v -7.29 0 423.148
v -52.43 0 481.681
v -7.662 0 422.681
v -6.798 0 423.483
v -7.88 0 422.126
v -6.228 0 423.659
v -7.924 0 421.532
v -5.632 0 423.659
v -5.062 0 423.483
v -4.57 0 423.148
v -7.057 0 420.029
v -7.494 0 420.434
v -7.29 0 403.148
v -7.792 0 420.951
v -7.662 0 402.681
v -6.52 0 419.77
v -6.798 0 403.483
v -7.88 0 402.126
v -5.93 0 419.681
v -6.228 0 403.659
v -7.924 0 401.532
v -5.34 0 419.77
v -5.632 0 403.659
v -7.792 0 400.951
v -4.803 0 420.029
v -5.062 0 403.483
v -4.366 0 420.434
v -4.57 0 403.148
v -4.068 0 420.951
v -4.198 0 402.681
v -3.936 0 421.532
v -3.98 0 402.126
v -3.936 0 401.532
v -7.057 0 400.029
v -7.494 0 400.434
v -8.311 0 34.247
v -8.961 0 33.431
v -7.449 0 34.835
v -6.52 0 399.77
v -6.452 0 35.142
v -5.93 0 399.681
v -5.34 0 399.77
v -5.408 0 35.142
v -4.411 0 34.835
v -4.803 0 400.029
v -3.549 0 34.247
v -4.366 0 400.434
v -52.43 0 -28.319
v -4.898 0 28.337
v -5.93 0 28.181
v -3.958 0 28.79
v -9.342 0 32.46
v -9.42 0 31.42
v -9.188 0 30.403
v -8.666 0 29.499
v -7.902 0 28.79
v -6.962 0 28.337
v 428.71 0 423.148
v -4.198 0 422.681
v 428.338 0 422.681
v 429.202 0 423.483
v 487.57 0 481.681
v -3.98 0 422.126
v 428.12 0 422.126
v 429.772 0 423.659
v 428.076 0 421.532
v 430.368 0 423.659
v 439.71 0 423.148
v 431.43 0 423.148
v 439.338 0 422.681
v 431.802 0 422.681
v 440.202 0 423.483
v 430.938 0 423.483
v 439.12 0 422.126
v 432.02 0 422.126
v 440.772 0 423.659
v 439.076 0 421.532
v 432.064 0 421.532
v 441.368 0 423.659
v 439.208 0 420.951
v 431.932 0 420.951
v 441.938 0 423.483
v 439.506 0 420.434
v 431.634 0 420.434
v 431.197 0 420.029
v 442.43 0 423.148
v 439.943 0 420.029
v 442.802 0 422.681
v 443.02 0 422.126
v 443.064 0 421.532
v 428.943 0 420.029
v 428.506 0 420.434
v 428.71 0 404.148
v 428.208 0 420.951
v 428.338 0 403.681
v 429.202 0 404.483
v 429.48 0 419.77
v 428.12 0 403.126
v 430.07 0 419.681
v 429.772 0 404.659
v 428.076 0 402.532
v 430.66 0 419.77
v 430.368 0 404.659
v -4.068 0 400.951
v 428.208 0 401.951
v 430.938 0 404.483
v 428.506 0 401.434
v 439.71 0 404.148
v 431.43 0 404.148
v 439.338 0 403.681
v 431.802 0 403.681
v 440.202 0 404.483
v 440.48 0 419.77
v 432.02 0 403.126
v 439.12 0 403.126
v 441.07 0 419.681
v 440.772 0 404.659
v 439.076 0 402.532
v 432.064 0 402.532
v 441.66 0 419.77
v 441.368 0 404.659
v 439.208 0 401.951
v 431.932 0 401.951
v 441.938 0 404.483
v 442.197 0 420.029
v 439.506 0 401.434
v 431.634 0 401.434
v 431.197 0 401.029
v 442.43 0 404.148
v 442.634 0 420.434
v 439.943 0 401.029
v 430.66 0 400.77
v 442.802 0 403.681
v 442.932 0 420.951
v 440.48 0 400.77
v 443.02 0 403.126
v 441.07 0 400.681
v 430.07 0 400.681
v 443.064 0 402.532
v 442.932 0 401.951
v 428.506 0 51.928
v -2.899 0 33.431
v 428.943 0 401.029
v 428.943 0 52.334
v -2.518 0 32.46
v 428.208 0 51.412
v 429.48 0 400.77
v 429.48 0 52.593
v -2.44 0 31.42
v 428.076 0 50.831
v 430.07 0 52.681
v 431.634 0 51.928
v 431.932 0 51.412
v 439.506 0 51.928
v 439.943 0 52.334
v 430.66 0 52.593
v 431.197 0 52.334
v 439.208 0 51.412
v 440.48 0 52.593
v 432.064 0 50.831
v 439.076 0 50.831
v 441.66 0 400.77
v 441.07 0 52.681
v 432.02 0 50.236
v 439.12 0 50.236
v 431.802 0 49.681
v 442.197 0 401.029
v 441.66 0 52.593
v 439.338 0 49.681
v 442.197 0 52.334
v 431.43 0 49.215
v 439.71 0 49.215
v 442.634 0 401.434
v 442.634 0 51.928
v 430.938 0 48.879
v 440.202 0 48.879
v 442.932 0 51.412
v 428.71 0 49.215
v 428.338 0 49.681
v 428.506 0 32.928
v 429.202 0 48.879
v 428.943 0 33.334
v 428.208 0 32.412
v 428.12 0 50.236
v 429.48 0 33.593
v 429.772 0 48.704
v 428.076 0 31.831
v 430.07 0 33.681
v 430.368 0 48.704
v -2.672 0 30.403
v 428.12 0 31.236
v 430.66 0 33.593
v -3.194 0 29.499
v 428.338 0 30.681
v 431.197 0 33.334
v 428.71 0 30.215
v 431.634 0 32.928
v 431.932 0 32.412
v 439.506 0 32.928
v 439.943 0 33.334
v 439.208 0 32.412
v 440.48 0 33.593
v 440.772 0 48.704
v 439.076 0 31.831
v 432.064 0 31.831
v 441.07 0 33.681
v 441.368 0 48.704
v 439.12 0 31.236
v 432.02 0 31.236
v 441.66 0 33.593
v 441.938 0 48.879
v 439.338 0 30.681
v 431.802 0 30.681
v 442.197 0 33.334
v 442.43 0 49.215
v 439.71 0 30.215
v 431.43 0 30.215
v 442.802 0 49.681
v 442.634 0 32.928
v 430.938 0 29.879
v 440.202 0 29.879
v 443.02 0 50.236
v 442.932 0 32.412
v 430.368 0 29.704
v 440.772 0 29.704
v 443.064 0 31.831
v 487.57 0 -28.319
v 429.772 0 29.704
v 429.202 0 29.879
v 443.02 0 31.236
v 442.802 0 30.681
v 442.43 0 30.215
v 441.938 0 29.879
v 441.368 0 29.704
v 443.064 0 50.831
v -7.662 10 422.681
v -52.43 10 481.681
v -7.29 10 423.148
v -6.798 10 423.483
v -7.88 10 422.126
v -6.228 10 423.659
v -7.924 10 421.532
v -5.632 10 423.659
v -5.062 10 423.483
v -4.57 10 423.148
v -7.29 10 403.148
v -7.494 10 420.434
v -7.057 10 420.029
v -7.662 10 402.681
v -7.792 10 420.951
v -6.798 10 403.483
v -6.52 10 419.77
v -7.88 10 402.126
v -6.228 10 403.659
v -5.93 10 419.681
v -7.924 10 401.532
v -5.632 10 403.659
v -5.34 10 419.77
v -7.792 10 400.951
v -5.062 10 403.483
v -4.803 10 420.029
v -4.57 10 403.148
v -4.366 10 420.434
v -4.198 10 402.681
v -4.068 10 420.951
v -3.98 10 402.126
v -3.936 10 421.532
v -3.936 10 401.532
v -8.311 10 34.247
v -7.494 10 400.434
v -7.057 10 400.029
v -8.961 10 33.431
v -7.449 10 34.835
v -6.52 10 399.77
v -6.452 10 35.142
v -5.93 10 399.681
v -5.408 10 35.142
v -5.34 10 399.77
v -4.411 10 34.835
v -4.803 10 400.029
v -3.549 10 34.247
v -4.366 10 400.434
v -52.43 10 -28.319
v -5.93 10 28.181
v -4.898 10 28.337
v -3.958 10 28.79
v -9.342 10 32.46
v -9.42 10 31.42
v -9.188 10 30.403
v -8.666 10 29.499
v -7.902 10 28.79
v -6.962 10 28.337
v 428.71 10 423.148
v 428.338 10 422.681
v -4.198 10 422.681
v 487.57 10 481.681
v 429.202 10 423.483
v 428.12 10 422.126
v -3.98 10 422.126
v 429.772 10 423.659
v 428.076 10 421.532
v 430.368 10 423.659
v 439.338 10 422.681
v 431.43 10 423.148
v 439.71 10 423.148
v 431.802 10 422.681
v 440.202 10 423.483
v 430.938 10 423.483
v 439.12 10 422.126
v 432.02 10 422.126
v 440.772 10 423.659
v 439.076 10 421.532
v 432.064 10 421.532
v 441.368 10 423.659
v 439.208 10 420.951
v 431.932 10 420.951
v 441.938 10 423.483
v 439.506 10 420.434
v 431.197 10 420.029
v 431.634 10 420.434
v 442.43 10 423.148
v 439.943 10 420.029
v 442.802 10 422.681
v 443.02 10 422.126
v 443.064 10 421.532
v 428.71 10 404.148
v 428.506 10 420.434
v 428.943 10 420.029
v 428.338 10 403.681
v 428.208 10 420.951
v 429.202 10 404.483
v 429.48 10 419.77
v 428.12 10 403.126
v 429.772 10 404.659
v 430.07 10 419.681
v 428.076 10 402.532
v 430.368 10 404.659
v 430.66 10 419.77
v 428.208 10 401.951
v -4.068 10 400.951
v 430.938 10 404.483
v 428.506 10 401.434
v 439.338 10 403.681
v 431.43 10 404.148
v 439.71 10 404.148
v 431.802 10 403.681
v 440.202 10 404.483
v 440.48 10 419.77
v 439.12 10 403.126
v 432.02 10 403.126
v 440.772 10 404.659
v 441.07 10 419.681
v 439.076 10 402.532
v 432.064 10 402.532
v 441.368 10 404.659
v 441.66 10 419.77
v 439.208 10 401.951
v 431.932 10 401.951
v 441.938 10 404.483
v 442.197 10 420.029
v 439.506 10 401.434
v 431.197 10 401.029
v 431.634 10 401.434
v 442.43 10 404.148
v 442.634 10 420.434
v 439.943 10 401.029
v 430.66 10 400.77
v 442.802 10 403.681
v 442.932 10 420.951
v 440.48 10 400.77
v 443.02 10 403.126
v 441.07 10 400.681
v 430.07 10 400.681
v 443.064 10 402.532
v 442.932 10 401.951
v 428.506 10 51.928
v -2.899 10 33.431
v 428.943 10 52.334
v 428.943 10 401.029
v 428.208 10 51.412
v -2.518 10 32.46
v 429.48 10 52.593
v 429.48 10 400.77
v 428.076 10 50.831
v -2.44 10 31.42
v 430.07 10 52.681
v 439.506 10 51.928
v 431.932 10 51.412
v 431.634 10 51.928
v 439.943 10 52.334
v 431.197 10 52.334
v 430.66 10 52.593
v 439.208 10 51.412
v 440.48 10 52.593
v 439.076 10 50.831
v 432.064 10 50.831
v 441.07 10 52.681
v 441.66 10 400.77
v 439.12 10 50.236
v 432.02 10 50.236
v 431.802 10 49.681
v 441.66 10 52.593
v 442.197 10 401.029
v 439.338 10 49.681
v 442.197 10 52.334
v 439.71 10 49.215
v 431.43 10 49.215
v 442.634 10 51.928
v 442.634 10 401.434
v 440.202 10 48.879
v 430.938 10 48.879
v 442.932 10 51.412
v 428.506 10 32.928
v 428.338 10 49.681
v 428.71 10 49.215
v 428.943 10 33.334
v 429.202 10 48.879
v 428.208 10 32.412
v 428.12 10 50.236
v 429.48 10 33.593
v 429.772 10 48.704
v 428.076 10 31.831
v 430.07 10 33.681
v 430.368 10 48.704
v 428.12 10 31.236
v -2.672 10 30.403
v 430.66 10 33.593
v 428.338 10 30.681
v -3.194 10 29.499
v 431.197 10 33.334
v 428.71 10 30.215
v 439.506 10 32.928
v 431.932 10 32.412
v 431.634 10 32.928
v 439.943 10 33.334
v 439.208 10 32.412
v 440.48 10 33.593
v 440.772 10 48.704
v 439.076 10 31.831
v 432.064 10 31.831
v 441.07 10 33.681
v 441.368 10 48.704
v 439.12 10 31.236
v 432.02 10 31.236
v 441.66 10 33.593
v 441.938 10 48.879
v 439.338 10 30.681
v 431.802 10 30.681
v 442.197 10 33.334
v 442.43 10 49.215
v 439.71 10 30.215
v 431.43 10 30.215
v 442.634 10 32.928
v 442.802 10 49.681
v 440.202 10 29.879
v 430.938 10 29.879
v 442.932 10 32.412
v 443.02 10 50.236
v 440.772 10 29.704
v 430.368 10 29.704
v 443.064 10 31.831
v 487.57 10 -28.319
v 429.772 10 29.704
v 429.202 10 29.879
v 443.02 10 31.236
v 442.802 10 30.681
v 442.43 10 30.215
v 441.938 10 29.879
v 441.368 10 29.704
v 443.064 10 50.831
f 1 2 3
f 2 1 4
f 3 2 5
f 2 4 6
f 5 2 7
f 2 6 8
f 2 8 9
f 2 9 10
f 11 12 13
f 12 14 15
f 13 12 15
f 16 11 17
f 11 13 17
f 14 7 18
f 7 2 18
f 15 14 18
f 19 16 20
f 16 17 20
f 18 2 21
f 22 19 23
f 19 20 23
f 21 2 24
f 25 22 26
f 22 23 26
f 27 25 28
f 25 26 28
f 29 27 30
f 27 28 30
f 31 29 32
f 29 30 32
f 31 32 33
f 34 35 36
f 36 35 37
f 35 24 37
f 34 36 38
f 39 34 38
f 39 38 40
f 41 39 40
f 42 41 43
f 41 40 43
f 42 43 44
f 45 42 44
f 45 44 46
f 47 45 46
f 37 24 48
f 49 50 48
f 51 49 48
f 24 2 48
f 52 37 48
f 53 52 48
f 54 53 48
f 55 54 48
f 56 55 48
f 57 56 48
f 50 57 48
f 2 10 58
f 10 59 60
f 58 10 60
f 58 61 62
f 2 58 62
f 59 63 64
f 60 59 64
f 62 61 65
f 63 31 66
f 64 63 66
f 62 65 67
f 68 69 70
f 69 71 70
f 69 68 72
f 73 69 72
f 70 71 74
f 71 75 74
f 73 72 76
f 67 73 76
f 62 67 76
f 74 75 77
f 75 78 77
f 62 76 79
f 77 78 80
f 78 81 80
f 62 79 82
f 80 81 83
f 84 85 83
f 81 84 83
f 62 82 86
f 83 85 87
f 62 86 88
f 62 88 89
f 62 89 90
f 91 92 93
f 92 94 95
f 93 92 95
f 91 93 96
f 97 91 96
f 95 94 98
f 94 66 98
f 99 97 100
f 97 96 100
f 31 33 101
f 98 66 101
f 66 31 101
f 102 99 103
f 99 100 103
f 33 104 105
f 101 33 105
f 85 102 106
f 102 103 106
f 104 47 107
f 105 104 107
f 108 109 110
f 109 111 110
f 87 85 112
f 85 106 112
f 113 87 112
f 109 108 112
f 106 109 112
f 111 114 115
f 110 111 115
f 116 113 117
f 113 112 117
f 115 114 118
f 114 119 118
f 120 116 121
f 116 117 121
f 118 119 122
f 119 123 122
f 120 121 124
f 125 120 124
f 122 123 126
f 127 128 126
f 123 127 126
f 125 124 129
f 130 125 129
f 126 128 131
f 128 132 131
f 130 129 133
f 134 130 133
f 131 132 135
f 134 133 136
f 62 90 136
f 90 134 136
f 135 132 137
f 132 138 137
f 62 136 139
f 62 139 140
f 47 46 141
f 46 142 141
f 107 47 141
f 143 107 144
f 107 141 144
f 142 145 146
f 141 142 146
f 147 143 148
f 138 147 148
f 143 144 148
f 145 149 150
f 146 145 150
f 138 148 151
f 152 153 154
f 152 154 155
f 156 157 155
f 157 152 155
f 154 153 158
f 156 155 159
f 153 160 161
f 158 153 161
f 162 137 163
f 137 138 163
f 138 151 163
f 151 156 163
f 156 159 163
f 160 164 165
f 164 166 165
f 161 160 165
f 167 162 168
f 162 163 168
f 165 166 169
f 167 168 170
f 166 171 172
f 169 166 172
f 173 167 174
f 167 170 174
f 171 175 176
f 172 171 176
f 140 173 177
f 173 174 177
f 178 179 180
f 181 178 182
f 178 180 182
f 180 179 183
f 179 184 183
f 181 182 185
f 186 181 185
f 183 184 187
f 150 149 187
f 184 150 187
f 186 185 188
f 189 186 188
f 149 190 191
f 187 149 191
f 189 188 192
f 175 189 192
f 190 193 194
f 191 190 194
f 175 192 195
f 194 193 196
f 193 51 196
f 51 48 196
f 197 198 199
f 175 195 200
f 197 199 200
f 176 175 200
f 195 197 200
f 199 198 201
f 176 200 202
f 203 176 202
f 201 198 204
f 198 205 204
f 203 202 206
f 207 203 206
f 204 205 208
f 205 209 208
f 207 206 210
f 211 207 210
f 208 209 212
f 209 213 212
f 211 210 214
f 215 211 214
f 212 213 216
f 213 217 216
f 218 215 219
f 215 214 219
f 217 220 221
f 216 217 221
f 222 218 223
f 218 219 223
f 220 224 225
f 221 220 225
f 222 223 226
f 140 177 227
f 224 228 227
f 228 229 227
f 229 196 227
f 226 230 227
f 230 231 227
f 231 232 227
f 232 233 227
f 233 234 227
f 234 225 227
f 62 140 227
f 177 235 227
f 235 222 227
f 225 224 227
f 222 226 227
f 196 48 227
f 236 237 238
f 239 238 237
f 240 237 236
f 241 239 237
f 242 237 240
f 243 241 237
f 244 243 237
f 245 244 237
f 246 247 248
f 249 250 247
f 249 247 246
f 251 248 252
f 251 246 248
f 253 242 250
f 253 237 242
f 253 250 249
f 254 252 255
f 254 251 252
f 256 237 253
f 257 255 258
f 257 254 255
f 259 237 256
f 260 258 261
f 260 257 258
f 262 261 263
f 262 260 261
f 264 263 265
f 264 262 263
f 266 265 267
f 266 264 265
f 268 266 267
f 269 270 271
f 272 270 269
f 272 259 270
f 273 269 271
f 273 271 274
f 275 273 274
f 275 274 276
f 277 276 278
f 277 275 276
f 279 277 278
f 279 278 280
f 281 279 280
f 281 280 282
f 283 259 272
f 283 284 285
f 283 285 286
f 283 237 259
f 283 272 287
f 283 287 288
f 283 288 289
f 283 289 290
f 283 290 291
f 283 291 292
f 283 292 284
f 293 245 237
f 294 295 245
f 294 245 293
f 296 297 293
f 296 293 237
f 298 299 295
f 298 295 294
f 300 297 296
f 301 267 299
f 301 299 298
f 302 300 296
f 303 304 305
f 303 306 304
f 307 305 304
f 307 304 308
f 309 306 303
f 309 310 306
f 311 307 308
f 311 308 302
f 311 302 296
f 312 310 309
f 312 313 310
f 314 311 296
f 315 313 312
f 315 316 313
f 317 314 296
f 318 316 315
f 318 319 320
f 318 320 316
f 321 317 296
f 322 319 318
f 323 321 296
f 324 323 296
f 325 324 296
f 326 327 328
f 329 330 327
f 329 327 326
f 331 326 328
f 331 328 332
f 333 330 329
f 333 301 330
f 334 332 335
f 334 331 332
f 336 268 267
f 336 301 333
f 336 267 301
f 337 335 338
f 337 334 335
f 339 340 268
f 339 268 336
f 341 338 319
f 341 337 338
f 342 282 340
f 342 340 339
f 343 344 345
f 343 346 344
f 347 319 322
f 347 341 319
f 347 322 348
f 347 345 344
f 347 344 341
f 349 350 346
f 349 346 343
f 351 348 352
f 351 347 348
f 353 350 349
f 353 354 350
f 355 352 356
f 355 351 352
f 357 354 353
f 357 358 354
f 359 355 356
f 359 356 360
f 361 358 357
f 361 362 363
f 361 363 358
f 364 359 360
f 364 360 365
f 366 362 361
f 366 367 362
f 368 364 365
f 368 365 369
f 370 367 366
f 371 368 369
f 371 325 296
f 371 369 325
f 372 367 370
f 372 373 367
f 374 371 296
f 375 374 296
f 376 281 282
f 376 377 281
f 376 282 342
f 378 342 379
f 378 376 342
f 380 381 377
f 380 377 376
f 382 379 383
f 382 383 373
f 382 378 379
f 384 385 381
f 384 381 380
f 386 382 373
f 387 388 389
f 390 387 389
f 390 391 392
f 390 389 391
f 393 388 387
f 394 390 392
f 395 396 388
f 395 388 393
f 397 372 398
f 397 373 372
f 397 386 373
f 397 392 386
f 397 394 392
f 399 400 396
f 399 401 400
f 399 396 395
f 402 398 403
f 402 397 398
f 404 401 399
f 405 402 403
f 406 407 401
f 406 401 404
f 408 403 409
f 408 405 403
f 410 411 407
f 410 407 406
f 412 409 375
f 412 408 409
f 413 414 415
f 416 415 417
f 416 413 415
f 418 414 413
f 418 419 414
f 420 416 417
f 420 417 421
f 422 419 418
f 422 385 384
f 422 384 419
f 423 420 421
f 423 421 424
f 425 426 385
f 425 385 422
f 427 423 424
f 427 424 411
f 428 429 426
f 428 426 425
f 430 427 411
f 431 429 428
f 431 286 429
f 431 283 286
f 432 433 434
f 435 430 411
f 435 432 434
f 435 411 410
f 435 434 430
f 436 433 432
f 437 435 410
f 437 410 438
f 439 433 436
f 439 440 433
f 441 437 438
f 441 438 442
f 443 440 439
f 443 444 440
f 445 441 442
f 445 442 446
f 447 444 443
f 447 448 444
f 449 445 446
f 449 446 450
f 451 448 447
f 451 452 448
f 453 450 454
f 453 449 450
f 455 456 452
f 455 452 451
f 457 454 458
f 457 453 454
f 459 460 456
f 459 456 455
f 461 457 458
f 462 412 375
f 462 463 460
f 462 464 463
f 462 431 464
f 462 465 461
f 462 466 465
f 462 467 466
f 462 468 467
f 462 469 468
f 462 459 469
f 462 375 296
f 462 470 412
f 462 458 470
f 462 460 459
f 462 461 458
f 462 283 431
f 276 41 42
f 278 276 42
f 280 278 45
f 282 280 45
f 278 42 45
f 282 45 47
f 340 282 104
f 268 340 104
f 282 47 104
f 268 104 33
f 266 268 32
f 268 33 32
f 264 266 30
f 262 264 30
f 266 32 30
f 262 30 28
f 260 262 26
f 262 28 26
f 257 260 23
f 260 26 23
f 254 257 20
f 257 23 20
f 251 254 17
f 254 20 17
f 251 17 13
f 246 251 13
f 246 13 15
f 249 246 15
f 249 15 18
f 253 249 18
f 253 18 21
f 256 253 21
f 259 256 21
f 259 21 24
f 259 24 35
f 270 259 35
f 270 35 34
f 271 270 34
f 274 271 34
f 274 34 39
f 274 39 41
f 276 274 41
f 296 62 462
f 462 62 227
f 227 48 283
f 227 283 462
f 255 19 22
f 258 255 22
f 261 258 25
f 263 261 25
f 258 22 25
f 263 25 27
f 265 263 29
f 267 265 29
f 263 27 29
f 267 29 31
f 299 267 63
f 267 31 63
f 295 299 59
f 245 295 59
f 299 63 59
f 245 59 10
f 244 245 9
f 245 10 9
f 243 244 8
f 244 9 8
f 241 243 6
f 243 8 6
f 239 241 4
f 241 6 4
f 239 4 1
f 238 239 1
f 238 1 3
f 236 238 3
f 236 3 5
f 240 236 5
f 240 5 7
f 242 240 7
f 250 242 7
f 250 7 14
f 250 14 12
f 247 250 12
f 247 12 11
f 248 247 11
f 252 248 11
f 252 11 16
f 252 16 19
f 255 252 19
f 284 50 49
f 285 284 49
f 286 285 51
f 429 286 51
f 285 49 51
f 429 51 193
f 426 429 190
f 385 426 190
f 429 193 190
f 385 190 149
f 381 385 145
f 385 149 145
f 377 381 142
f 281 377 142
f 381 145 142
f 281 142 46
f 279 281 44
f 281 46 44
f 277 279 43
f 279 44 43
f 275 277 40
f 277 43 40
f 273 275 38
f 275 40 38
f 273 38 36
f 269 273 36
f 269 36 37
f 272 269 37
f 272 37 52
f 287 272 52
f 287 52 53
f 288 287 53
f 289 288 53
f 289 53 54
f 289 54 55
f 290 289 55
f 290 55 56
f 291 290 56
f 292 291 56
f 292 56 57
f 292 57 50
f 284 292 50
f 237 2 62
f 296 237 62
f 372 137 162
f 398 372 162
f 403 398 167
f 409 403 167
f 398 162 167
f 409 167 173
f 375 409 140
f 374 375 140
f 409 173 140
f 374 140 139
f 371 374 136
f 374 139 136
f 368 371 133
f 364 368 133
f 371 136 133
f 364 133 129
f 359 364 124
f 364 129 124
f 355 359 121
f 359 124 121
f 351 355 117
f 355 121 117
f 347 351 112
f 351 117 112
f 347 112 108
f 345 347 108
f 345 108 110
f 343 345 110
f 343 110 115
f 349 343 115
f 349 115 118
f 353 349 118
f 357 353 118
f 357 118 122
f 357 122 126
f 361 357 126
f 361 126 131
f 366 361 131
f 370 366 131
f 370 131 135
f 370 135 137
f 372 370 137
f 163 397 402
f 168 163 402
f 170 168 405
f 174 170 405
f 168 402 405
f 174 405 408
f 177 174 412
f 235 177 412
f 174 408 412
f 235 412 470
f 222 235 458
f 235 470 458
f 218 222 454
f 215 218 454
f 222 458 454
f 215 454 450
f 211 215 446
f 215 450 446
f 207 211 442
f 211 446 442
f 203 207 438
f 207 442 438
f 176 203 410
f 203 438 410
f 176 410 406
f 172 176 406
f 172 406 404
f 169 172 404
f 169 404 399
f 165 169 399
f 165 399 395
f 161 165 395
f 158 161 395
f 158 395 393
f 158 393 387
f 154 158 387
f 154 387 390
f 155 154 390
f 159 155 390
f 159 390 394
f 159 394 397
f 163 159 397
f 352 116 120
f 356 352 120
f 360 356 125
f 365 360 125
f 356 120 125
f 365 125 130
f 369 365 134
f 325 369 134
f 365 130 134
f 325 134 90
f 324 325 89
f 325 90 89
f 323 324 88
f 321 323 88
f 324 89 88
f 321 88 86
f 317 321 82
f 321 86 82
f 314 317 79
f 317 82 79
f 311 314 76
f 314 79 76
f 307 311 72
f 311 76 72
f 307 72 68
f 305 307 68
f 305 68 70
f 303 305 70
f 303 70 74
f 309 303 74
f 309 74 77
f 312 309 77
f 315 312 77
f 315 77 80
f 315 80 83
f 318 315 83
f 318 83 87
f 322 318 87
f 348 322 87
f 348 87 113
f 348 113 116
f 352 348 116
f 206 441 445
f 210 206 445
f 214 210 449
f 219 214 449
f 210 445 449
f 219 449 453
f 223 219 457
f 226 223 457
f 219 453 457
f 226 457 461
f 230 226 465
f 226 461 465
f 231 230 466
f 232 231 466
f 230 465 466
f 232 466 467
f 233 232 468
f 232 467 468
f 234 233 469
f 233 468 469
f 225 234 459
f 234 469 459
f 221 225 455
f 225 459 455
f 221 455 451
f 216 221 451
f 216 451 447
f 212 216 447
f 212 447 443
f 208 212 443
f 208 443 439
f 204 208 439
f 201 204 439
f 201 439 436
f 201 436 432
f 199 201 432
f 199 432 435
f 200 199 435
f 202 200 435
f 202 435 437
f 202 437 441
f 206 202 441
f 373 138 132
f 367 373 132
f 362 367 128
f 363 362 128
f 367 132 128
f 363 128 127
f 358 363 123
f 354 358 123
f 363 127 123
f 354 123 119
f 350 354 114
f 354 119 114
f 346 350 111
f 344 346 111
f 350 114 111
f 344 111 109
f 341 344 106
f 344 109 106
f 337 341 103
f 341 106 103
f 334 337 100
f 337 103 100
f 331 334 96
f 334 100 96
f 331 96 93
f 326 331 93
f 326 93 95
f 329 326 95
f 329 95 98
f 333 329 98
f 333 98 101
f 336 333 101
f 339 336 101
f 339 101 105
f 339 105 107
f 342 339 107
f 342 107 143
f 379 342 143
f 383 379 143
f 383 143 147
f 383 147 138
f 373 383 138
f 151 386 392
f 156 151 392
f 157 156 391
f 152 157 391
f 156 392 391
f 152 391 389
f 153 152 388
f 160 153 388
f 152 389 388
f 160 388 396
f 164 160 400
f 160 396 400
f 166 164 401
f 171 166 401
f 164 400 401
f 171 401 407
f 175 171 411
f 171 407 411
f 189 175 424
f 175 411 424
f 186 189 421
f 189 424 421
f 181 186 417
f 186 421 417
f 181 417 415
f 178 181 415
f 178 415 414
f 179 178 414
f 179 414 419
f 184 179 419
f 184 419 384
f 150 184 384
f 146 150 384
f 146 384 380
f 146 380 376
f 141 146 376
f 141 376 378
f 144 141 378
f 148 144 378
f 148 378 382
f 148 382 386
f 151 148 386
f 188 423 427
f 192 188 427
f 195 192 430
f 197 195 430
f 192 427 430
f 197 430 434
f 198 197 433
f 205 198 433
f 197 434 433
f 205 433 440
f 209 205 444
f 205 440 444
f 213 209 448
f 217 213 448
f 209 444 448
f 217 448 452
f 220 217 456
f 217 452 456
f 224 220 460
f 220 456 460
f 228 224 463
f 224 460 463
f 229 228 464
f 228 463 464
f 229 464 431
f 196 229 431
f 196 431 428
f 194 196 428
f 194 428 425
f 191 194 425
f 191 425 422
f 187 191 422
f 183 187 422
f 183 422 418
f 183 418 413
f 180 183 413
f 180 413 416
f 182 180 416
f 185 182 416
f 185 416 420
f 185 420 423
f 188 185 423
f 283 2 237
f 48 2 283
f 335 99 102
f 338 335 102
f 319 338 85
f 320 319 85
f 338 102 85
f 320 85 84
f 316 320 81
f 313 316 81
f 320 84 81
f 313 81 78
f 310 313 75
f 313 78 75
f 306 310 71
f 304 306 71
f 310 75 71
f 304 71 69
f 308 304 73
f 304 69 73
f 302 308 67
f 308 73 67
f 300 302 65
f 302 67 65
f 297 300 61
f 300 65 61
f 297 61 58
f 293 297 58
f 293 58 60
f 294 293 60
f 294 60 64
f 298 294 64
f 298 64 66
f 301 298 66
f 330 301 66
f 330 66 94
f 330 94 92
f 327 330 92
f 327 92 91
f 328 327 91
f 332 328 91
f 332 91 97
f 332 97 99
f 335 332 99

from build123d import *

# Parameters (mm, degrees)
SKETCH3_W           = 540
SKETCH3_H           = 510
BOSS_EXTRUDE1_DEPTH = 10
SKETCH4_R           = 2
CUT_EXTRUDE1_DEPTH  = 686.449855216
SKETCH6_R           = 2
CUT_EXTRUDE2_DEPTH  = 686.449855216
SKETCH7_R           = 3.5
CUT_EXTRUDE3_DEPTH  = 686.449855216
SKETCH8_R           = 2
CUT_EXTRUDE4_DEPTH  = 686.449855216


with BuildPart() as part:
    # Sketch3 → Boss-Extrude1 (new body)
    with BuildSketch(Plane(origin=(0, 0, 0), x_dir=(1, 0, 0), z_dir=(0, 1, 0))):
        with Locations((217.56999237, -226.681436799)):
            Rectangle(SKETCH3_W, SKETCH3_H)
    extrude(amount=BOSS_EXTRUDE1_DEPTH)

    # Sketch4 → Cut-Extrude1 (cut, through all)
    with BuildSketch(Plane(origin=(0, 10, 0), x_dir=(1, 0, 0), z_dir=(0, 1, 0))):
        with Locations((441.06999237, -31.681436799)):
            Circle(SKETCH4_R)
        with Locations((430.06999237, -31.681436799)):
            Circle(SKETCH4_R)
        with Locations((441.06999237, -50.681436799)):
            Circle(SKETCH4_R)
        with Locations((430.06999237, -50.681436799)):
            Circle(SKETCH4_R)
    extrude(amount=-CUT_EXTRUDE1_DEPTH, mode=Mode.SUBTRACT)

    # Sketch6 → Cut-Extrude2 (cut, through all)
    with BuildSketch(Plane.XZ):
        with Locations((441.06999237, 421.681436799)):
            Circle(SKETCH6_R)
        with Locations((430.06999237, 421.681436799)):
            Circle(SKETCH6_R)
        with Locations((441.06999237, 402.681436799)):
            Circle(SKETCH6_R)
        with Locations((430.06999237, 402.681436799)):
            Circle(SKETCH6_R)
    extrude(amount=-CUT_EXTRUDE2_DEPTH, mode=Mode.SUBTRACT)

    # Sketch7 → Cut-Extrude3 (cut, through all)
    with BuildSketch(Plane.XZ):
        with Locations((-5.93000763, 31.681436799)):
            Circle(SKETCH7_R)
    extrude(amount=-CUT_EXTRUDE3_DEPTH, mode=Mode.SUBTRACT)

    # Sketch8 → Cut-Extrude4 (cut, through all)
    with BuildSketch(Plane.XZ):
        with Locations((-5.93000763, 421.681436799)):
            Circle(SKETCH8_R)
        with Locations((-5.93000763, 401.681436799)):
            Circle(SKETCH8_R)
    extrude(amount=-CUT_EXTRUDE4_DEPTH, mode=Mode.SUBTRACT)


solid = part.part
